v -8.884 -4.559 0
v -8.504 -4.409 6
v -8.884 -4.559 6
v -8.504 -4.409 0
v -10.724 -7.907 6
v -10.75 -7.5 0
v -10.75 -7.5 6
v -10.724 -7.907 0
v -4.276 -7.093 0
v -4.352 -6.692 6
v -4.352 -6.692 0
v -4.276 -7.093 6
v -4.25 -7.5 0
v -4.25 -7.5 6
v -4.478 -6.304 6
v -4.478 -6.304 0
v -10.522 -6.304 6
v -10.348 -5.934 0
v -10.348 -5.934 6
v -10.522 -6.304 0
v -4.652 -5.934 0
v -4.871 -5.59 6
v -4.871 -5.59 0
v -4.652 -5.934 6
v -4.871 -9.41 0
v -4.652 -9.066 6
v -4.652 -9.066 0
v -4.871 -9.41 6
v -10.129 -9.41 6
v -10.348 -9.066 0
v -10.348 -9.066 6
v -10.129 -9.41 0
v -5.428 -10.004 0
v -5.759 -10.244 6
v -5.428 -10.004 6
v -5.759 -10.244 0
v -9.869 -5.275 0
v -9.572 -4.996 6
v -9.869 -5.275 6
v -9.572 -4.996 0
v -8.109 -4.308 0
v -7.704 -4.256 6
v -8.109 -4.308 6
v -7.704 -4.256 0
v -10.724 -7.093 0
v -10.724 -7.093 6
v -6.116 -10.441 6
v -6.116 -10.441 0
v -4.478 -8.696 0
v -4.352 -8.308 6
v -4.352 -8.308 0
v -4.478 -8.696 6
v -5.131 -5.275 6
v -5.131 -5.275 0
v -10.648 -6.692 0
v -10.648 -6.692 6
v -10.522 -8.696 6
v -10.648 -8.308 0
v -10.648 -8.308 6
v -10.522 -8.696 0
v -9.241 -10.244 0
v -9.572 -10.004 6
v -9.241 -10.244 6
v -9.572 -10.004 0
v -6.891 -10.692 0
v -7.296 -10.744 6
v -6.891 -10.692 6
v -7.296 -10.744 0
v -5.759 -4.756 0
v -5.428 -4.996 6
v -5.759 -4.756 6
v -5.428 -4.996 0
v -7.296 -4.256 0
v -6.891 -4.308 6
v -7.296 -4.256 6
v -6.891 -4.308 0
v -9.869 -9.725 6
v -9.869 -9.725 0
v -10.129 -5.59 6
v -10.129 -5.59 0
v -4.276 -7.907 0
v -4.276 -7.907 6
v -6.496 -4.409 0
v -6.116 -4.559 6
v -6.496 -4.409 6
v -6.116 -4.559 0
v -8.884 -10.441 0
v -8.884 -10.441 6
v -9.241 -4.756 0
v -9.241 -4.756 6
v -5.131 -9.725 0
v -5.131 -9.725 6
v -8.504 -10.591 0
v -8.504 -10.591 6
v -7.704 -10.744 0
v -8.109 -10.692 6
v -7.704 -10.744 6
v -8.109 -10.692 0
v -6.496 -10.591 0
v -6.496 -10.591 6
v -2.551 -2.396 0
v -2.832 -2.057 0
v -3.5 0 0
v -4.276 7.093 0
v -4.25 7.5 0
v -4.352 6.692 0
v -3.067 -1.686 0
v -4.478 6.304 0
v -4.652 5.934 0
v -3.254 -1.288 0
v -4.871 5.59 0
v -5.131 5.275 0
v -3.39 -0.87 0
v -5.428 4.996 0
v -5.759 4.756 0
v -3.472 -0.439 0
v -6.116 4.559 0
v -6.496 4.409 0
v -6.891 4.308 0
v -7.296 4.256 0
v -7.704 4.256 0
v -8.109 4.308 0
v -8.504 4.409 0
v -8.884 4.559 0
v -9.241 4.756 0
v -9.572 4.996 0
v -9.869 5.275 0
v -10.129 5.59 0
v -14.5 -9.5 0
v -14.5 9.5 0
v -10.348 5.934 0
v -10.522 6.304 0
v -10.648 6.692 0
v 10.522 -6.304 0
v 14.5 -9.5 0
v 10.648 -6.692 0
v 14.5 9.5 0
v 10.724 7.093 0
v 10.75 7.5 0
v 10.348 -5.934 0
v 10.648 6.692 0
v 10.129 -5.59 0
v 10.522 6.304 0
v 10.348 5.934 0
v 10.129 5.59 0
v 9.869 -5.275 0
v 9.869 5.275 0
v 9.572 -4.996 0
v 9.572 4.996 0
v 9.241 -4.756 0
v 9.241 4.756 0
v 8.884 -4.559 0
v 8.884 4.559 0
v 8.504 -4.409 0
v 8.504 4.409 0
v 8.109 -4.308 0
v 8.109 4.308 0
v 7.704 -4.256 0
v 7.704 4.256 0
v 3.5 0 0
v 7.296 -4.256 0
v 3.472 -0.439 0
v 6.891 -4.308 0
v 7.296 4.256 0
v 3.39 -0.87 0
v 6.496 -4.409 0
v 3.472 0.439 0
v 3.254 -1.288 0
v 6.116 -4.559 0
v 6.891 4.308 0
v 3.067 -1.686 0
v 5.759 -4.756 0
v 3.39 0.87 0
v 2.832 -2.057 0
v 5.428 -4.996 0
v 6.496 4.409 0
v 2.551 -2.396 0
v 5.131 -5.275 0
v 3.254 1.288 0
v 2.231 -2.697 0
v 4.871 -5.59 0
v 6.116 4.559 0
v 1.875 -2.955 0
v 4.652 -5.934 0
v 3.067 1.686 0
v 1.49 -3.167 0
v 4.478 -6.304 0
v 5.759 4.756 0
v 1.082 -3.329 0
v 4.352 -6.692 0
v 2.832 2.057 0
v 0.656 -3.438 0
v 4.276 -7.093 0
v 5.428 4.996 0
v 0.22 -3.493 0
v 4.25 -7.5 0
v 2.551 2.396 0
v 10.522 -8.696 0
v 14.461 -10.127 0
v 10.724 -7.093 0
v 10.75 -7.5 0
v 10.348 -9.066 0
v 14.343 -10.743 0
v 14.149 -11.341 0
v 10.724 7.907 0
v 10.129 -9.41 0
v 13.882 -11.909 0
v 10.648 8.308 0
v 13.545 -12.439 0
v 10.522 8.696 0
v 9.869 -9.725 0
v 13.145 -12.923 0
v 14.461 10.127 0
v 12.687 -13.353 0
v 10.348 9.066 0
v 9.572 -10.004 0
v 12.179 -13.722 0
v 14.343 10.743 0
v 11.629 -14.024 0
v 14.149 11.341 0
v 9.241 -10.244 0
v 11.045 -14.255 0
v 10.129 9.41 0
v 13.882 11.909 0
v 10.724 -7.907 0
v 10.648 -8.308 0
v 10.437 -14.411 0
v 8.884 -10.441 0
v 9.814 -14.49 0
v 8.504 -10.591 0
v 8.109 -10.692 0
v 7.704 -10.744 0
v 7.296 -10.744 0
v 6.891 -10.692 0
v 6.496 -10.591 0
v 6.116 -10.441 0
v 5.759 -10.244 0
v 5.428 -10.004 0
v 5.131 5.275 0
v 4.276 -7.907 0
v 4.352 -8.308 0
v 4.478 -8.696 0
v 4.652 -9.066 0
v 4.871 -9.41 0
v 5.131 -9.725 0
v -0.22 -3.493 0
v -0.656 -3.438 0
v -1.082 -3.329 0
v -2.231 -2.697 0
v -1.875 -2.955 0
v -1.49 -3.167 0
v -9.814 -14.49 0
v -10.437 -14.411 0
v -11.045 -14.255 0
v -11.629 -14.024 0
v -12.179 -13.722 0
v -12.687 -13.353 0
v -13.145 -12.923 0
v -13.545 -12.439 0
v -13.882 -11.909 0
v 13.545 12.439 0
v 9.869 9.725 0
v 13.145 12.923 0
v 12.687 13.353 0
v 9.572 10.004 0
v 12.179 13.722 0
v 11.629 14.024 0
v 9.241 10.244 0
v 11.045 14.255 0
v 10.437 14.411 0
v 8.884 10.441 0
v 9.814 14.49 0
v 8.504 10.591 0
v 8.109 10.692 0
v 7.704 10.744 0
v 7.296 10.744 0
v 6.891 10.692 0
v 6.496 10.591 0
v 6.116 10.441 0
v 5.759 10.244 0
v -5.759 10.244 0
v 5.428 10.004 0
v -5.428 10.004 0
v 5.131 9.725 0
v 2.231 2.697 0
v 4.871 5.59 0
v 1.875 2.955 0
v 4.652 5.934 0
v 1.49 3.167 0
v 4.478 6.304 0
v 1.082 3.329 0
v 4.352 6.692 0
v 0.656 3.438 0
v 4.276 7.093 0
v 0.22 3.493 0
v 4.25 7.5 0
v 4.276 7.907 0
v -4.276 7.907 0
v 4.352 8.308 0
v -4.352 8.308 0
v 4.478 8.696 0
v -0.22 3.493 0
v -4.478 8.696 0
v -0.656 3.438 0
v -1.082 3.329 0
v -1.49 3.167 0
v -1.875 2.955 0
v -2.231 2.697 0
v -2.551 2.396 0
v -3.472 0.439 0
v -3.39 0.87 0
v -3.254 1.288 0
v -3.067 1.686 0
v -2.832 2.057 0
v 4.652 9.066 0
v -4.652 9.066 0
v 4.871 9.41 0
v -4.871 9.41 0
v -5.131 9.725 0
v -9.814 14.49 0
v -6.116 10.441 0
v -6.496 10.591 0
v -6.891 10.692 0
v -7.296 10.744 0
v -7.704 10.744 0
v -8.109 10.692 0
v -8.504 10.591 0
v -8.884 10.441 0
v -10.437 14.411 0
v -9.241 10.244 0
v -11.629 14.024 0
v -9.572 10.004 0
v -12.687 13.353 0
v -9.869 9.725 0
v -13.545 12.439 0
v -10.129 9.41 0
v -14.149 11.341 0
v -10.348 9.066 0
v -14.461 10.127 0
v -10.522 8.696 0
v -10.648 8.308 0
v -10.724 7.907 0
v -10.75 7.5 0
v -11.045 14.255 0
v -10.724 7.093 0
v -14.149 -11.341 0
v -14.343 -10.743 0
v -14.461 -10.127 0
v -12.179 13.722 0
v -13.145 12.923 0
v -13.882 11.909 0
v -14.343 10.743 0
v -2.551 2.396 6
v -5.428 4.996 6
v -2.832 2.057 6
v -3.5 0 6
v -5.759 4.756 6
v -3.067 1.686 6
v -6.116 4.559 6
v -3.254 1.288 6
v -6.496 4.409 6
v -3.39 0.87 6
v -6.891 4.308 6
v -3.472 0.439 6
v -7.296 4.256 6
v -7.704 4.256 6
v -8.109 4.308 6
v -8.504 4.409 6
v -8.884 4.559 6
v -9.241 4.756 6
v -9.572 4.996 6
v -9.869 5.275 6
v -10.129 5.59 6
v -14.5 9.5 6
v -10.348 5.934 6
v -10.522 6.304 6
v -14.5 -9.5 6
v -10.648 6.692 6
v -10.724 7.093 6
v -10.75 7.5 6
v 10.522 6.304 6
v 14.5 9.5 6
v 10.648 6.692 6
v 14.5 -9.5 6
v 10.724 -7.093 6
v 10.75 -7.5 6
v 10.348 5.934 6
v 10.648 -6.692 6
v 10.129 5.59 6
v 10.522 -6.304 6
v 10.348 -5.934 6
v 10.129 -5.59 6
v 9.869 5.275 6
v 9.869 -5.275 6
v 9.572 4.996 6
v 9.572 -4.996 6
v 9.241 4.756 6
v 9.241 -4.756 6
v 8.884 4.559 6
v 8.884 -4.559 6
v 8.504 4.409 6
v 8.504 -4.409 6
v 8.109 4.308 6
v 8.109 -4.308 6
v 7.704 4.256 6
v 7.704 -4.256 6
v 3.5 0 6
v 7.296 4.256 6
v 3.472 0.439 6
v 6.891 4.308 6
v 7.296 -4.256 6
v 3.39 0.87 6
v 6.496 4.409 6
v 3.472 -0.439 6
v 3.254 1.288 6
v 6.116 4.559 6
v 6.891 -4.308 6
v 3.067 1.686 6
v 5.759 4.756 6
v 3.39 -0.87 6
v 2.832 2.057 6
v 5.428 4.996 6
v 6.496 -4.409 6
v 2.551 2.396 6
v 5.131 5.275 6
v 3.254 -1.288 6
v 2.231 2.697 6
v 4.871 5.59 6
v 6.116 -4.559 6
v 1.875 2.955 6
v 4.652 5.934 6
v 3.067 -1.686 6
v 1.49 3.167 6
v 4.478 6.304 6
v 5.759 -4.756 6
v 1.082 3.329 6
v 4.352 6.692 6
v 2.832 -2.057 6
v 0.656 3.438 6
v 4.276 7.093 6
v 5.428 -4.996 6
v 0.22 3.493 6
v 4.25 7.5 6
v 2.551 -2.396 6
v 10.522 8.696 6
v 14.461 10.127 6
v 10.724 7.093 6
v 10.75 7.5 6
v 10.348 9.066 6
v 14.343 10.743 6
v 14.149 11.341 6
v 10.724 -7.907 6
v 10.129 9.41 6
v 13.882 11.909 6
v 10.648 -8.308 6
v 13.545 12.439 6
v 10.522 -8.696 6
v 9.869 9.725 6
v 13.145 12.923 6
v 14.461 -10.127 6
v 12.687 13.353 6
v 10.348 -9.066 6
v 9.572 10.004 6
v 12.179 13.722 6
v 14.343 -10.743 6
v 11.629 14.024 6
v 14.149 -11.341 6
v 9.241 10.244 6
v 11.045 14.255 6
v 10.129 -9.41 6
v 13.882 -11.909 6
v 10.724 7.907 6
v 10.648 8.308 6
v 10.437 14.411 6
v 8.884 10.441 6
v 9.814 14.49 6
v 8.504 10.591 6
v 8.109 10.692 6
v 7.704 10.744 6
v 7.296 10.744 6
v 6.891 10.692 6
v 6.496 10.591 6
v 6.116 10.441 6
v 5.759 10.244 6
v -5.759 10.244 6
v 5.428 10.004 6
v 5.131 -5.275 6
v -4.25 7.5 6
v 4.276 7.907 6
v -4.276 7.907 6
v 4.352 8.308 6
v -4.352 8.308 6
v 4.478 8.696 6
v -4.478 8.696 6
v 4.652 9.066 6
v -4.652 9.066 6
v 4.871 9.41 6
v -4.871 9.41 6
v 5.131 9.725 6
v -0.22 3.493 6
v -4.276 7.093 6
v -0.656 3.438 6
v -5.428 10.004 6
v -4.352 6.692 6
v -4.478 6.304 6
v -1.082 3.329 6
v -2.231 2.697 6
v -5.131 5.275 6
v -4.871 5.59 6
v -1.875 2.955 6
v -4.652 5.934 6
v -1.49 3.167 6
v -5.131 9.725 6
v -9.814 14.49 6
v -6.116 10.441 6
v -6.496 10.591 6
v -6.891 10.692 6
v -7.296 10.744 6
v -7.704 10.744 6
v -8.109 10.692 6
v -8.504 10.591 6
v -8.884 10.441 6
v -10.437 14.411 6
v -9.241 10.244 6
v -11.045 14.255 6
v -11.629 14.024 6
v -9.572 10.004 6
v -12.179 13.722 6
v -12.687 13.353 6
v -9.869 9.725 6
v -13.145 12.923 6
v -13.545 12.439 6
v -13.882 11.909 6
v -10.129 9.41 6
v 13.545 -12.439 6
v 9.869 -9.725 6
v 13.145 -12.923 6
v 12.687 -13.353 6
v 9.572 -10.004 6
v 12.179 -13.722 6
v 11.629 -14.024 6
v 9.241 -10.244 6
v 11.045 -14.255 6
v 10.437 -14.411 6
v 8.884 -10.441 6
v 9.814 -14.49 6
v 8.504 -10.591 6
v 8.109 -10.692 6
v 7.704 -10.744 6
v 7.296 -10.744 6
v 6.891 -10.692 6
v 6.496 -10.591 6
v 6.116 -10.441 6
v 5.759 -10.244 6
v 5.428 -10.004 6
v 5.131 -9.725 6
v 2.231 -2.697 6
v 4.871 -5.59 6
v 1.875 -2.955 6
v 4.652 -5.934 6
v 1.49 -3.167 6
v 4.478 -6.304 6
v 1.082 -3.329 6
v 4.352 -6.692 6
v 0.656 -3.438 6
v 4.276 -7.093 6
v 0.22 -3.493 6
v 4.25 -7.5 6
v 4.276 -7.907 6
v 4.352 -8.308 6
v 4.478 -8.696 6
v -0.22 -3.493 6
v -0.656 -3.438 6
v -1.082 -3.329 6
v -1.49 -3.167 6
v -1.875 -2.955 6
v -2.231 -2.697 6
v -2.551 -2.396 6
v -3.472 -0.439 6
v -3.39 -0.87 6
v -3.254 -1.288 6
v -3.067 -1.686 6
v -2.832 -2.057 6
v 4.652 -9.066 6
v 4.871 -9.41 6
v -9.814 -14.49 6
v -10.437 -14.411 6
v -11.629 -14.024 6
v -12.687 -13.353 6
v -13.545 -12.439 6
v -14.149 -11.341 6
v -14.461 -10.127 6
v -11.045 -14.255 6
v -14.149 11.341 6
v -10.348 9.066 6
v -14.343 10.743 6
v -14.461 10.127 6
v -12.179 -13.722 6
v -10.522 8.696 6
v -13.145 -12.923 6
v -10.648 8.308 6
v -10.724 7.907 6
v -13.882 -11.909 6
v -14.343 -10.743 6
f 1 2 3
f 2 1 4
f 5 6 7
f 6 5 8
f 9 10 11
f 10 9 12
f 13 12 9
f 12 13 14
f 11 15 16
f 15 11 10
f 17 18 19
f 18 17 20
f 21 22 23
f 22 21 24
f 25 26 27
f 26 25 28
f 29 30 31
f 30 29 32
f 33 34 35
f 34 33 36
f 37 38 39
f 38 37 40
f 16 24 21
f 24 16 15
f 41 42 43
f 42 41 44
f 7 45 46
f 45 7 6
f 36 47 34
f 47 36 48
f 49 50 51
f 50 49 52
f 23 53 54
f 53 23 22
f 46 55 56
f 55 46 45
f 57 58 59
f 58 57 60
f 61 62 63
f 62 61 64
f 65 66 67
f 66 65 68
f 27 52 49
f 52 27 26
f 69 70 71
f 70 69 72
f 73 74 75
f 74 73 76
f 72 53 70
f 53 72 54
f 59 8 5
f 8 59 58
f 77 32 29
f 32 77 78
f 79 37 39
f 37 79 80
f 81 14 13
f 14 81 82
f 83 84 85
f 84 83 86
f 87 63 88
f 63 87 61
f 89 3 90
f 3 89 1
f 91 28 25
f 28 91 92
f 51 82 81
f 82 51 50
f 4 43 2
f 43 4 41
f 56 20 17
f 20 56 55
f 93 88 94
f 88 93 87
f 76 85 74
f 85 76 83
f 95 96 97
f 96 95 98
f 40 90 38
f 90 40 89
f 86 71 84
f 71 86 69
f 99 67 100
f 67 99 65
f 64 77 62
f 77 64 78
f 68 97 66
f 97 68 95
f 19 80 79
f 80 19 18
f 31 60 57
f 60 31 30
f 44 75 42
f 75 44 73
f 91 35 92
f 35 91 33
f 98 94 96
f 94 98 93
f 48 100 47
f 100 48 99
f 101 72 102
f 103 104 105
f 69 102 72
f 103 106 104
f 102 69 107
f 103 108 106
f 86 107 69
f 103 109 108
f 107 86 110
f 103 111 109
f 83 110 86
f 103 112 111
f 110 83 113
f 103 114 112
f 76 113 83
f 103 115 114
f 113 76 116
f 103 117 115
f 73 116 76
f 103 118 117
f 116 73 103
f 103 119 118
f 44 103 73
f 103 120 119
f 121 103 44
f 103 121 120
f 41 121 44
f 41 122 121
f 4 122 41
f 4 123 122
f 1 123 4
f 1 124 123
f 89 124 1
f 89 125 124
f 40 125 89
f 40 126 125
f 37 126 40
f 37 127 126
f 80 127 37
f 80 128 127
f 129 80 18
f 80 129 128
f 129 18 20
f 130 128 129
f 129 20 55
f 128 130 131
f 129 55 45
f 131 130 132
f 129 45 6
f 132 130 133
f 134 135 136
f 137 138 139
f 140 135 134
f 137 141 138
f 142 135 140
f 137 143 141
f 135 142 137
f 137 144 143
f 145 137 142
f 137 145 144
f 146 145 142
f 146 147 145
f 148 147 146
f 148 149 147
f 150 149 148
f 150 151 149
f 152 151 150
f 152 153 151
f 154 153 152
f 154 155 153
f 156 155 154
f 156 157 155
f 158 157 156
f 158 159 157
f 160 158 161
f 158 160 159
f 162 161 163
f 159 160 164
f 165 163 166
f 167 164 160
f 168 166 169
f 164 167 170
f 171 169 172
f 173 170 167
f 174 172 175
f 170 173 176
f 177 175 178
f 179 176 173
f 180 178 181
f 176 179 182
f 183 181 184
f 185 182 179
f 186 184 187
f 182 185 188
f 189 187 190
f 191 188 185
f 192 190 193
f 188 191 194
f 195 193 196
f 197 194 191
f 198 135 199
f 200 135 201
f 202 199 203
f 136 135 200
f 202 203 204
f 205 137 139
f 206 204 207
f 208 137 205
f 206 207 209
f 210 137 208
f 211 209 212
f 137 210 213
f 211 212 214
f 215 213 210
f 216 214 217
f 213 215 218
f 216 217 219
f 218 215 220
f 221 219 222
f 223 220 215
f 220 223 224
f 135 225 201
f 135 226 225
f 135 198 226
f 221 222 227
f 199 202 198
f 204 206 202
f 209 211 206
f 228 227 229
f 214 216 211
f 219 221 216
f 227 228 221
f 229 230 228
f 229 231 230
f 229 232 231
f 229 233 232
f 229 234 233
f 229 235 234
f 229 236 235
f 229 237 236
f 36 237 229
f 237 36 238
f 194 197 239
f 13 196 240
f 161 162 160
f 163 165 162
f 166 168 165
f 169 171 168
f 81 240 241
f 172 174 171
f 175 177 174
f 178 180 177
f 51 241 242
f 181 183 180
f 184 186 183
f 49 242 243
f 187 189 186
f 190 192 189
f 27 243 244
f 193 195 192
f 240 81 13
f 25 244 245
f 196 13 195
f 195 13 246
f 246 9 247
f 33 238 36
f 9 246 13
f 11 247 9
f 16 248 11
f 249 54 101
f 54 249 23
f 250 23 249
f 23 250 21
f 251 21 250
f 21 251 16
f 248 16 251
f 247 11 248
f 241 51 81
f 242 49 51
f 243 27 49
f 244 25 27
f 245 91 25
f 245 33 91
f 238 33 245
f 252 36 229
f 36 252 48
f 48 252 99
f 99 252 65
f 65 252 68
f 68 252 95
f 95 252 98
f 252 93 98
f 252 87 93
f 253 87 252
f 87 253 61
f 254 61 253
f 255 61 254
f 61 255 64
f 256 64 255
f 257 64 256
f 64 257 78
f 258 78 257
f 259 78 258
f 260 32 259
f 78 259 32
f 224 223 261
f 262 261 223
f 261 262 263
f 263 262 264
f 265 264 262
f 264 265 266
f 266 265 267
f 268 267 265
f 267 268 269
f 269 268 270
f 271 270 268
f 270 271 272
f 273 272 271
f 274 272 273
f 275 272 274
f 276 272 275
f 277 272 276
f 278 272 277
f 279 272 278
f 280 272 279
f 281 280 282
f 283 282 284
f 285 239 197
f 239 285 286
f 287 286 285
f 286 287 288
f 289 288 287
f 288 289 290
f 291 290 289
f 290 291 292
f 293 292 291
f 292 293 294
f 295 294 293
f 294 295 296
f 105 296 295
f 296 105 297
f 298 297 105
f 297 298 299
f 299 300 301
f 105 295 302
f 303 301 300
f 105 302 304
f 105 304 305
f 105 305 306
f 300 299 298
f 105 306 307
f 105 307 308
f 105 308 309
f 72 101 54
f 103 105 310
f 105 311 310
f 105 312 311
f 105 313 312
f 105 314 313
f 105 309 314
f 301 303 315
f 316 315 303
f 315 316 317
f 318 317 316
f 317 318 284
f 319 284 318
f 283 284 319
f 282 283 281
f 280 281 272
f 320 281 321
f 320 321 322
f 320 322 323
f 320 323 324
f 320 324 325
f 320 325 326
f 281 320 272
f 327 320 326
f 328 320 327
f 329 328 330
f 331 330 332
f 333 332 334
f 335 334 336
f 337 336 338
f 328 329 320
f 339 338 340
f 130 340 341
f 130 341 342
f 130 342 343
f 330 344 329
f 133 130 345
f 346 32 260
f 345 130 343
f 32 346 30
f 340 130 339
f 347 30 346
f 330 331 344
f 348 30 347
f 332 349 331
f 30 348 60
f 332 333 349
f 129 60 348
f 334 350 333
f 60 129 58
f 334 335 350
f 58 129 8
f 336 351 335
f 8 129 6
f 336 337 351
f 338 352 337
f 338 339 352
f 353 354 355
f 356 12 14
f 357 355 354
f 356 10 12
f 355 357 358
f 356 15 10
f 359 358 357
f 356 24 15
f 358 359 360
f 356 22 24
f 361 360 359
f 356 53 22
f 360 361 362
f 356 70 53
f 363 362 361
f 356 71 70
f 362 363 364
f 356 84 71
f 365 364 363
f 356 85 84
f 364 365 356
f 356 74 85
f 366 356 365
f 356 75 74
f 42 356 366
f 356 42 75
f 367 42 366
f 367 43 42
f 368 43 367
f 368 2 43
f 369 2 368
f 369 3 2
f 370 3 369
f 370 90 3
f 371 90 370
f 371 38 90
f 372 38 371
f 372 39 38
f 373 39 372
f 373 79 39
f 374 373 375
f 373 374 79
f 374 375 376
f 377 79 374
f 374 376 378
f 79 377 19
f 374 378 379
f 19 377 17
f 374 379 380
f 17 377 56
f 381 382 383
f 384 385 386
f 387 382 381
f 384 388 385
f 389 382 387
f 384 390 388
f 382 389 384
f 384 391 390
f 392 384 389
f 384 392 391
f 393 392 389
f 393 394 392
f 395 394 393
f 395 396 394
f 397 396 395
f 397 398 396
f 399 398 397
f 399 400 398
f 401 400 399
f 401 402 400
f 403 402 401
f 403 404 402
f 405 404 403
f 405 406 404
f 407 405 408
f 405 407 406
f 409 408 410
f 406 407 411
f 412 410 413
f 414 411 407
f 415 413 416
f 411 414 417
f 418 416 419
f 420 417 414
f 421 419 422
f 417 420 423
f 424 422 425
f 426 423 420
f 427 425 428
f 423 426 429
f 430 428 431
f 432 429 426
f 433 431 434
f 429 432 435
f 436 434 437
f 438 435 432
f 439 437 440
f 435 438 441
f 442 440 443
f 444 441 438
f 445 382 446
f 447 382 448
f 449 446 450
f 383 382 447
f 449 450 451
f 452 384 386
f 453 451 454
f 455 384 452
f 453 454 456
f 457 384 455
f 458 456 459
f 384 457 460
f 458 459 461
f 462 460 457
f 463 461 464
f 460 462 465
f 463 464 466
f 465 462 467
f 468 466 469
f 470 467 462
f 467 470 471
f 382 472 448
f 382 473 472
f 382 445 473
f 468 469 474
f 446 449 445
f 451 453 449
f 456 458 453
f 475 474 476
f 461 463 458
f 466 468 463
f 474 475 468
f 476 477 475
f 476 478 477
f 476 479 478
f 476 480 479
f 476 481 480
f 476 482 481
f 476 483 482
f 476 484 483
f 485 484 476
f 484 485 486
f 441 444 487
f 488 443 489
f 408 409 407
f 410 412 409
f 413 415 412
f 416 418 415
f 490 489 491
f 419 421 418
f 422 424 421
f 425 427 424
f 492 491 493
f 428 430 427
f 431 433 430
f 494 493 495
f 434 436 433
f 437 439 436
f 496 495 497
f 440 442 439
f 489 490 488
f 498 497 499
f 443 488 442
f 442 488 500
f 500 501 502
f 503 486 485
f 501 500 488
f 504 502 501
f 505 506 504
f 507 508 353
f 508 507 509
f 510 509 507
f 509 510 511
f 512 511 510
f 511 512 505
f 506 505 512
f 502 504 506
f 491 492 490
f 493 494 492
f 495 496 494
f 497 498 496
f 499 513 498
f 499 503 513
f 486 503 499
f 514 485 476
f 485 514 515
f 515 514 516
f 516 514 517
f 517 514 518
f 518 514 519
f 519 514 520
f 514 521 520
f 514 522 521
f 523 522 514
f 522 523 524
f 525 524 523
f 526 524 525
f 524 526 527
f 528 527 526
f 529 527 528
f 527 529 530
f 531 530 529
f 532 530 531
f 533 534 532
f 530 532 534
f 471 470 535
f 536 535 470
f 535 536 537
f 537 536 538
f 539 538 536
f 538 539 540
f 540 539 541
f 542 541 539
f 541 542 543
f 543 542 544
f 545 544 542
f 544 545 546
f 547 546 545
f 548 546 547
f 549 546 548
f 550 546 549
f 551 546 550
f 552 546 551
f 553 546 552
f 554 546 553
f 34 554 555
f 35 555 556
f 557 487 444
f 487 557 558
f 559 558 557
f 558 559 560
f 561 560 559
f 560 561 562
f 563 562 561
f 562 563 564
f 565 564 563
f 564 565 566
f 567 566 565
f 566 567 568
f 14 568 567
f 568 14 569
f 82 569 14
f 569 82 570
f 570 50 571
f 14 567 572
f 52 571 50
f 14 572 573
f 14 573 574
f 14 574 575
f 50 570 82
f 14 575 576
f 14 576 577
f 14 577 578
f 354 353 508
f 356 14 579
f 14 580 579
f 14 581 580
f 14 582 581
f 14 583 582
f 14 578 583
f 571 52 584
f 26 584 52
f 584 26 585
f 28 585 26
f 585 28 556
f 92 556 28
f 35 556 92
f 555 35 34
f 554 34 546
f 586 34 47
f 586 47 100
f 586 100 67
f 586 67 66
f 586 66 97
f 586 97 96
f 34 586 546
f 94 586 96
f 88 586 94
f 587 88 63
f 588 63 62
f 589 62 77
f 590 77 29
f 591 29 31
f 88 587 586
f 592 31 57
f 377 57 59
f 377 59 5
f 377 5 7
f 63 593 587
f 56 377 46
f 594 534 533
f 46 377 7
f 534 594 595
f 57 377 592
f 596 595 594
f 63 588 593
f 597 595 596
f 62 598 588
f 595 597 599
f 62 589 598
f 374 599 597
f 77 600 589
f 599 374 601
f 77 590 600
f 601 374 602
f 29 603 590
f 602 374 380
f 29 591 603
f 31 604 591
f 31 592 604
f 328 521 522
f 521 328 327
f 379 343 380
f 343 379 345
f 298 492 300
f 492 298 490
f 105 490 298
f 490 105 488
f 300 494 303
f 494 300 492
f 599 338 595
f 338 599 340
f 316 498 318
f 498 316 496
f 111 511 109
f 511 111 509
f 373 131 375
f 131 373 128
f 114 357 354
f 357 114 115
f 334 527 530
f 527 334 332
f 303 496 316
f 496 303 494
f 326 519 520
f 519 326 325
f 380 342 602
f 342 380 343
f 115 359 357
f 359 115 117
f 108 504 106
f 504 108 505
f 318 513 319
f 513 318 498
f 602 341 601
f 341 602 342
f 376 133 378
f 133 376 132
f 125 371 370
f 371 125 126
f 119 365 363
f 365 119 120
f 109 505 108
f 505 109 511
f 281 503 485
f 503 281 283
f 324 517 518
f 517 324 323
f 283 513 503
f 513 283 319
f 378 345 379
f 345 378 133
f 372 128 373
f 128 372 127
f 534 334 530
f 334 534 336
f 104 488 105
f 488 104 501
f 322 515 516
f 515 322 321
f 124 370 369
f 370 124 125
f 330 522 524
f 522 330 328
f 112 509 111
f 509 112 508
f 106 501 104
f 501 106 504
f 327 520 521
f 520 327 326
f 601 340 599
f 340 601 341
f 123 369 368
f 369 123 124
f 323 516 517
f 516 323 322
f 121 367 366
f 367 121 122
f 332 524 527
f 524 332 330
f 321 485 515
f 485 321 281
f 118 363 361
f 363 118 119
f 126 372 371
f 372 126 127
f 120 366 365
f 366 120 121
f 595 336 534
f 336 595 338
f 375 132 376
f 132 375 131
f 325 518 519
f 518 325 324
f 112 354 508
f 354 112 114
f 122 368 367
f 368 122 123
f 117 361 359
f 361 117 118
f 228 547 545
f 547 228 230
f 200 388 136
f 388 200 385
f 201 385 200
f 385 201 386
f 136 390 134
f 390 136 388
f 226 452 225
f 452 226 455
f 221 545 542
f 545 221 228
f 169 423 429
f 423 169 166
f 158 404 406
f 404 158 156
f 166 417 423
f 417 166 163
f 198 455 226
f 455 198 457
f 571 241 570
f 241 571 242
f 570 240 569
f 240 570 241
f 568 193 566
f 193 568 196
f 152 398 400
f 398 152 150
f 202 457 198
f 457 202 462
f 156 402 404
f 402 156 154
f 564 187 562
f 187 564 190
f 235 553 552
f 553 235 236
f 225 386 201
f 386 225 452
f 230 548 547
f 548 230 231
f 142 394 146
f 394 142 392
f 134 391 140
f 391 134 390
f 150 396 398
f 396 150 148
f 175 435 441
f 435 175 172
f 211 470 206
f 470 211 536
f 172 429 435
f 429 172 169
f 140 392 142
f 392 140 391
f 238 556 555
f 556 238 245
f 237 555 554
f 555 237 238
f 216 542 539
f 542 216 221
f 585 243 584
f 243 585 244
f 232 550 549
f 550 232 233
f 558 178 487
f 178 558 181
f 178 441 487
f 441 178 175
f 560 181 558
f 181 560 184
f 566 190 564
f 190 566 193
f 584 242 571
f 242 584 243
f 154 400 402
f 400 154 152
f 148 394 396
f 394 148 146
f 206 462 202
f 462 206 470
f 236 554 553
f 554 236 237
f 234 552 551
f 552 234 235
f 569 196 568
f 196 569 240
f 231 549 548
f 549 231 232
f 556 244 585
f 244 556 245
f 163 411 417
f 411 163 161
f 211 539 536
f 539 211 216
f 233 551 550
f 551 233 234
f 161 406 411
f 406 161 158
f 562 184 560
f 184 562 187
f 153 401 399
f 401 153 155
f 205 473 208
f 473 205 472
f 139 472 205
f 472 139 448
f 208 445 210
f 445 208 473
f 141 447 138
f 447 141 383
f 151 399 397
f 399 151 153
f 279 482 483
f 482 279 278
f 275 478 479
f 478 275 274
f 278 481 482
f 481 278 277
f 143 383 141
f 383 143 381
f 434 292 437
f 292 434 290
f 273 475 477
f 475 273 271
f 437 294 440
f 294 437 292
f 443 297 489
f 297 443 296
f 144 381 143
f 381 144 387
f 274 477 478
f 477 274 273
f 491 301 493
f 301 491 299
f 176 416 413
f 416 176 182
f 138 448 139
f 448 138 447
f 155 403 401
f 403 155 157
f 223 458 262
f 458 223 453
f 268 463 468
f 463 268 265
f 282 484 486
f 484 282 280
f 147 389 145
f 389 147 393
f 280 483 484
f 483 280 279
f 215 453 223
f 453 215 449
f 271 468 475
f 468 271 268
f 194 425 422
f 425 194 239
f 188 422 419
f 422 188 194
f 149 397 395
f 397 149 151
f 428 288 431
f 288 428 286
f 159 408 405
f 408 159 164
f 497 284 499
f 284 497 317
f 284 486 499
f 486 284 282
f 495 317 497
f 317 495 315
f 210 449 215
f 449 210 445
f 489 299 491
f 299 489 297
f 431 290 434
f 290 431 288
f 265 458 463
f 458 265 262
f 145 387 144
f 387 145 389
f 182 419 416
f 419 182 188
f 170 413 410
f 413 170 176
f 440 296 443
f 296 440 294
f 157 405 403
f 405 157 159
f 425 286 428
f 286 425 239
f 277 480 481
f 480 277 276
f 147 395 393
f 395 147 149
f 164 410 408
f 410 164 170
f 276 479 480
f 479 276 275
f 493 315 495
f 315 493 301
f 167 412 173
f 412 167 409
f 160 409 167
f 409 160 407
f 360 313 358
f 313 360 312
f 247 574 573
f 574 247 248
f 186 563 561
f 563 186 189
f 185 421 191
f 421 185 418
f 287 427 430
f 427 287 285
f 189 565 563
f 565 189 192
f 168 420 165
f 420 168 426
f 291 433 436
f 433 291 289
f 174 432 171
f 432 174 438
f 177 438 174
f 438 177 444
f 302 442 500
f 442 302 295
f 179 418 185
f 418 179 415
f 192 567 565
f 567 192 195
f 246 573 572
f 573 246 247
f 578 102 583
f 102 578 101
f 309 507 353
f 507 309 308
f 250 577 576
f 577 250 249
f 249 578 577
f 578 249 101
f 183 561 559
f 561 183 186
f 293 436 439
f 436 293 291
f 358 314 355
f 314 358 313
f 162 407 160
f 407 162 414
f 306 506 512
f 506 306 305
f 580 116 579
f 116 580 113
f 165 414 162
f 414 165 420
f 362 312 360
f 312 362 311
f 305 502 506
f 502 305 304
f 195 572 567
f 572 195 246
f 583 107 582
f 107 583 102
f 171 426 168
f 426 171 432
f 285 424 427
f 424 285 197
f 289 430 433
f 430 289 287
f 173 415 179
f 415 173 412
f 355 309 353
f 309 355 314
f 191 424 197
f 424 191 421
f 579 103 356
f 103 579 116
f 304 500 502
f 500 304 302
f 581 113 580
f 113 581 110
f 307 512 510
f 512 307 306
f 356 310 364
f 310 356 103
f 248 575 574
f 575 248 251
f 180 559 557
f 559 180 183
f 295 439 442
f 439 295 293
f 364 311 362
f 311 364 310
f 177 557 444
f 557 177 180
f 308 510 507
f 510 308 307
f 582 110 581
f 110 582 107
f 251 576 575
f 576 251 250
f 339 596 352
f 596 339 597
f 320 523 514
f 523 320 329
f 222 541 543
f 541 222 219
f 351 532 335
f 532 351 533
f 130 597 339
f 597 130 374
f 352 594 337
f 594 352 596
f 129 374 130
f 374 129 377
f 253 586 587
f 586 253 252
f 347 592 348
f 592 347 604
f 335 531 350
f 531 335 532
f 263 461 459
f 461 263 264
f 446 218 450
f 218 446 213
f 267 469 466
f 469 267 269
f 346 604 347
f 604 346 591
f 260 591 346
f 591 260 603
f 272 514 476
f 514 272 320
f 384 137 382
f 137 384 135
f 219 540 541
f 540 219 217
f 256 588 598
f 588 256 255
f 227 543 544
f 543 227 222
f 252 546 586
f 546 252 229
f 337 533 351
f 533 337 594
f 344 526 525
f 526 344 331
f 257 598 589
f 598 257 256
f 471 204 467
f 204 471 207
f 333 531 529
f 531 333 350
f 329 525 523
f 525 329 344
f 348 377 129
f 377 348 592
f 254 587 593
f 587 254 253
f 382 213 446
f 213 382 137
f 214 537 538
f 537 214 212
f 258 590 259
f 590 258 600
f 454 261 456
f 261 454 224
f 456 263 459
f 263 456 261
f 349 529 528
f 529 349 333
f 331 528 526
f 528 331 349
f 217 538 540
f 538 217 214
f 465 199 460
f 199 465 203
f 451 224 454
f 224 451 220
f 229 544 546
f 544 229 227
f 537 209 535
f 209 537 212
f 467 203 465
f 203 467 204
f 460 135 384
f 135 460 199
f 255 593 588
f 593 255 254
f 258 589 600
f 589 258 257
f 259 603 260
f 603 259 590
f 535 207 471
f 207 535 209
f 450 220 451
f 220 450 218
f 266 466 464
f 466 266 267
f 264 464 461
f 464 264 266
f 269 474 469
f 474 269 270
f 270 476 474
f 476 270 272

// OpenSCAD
$fn = 50;

difference() {
	union() {
		hull() {
			translate(v = [-9.5, 9.5, 0]) {
				cylinder(h = 6, r = 5);
			}
			translate(v = [9.5, 9.5, 0]) {
				cylinder(h = 6, r = 5);
			}
			translate(v = [-9.5, -9.5, 0]) {
				cylinder(h = 6, r = 5);
			}
			translate(v = [9.5, -9.5, 0]) {
				cylinder(h = 6, r = 5);
			}
		}
	}
	union() {
		translate(v = [-7.5, -7.5, 0]) {
			cylinder(h = 6, r = 3.25);
		}
		translate(v = [-7.5, 7.5, 0]) {
			cylinder(h = 6, r = 3.25);
		}
		translate(v = [7.5, -7.5, 0]) {
			cylinder(h = 6, r = 3.25);
		}
		translate(v = [7.5, 7.5, 0]) {
			cylinder(h = 6, r = 3.25);
		}
		cylinder(h = 6, r = 3.5);
	}
}
